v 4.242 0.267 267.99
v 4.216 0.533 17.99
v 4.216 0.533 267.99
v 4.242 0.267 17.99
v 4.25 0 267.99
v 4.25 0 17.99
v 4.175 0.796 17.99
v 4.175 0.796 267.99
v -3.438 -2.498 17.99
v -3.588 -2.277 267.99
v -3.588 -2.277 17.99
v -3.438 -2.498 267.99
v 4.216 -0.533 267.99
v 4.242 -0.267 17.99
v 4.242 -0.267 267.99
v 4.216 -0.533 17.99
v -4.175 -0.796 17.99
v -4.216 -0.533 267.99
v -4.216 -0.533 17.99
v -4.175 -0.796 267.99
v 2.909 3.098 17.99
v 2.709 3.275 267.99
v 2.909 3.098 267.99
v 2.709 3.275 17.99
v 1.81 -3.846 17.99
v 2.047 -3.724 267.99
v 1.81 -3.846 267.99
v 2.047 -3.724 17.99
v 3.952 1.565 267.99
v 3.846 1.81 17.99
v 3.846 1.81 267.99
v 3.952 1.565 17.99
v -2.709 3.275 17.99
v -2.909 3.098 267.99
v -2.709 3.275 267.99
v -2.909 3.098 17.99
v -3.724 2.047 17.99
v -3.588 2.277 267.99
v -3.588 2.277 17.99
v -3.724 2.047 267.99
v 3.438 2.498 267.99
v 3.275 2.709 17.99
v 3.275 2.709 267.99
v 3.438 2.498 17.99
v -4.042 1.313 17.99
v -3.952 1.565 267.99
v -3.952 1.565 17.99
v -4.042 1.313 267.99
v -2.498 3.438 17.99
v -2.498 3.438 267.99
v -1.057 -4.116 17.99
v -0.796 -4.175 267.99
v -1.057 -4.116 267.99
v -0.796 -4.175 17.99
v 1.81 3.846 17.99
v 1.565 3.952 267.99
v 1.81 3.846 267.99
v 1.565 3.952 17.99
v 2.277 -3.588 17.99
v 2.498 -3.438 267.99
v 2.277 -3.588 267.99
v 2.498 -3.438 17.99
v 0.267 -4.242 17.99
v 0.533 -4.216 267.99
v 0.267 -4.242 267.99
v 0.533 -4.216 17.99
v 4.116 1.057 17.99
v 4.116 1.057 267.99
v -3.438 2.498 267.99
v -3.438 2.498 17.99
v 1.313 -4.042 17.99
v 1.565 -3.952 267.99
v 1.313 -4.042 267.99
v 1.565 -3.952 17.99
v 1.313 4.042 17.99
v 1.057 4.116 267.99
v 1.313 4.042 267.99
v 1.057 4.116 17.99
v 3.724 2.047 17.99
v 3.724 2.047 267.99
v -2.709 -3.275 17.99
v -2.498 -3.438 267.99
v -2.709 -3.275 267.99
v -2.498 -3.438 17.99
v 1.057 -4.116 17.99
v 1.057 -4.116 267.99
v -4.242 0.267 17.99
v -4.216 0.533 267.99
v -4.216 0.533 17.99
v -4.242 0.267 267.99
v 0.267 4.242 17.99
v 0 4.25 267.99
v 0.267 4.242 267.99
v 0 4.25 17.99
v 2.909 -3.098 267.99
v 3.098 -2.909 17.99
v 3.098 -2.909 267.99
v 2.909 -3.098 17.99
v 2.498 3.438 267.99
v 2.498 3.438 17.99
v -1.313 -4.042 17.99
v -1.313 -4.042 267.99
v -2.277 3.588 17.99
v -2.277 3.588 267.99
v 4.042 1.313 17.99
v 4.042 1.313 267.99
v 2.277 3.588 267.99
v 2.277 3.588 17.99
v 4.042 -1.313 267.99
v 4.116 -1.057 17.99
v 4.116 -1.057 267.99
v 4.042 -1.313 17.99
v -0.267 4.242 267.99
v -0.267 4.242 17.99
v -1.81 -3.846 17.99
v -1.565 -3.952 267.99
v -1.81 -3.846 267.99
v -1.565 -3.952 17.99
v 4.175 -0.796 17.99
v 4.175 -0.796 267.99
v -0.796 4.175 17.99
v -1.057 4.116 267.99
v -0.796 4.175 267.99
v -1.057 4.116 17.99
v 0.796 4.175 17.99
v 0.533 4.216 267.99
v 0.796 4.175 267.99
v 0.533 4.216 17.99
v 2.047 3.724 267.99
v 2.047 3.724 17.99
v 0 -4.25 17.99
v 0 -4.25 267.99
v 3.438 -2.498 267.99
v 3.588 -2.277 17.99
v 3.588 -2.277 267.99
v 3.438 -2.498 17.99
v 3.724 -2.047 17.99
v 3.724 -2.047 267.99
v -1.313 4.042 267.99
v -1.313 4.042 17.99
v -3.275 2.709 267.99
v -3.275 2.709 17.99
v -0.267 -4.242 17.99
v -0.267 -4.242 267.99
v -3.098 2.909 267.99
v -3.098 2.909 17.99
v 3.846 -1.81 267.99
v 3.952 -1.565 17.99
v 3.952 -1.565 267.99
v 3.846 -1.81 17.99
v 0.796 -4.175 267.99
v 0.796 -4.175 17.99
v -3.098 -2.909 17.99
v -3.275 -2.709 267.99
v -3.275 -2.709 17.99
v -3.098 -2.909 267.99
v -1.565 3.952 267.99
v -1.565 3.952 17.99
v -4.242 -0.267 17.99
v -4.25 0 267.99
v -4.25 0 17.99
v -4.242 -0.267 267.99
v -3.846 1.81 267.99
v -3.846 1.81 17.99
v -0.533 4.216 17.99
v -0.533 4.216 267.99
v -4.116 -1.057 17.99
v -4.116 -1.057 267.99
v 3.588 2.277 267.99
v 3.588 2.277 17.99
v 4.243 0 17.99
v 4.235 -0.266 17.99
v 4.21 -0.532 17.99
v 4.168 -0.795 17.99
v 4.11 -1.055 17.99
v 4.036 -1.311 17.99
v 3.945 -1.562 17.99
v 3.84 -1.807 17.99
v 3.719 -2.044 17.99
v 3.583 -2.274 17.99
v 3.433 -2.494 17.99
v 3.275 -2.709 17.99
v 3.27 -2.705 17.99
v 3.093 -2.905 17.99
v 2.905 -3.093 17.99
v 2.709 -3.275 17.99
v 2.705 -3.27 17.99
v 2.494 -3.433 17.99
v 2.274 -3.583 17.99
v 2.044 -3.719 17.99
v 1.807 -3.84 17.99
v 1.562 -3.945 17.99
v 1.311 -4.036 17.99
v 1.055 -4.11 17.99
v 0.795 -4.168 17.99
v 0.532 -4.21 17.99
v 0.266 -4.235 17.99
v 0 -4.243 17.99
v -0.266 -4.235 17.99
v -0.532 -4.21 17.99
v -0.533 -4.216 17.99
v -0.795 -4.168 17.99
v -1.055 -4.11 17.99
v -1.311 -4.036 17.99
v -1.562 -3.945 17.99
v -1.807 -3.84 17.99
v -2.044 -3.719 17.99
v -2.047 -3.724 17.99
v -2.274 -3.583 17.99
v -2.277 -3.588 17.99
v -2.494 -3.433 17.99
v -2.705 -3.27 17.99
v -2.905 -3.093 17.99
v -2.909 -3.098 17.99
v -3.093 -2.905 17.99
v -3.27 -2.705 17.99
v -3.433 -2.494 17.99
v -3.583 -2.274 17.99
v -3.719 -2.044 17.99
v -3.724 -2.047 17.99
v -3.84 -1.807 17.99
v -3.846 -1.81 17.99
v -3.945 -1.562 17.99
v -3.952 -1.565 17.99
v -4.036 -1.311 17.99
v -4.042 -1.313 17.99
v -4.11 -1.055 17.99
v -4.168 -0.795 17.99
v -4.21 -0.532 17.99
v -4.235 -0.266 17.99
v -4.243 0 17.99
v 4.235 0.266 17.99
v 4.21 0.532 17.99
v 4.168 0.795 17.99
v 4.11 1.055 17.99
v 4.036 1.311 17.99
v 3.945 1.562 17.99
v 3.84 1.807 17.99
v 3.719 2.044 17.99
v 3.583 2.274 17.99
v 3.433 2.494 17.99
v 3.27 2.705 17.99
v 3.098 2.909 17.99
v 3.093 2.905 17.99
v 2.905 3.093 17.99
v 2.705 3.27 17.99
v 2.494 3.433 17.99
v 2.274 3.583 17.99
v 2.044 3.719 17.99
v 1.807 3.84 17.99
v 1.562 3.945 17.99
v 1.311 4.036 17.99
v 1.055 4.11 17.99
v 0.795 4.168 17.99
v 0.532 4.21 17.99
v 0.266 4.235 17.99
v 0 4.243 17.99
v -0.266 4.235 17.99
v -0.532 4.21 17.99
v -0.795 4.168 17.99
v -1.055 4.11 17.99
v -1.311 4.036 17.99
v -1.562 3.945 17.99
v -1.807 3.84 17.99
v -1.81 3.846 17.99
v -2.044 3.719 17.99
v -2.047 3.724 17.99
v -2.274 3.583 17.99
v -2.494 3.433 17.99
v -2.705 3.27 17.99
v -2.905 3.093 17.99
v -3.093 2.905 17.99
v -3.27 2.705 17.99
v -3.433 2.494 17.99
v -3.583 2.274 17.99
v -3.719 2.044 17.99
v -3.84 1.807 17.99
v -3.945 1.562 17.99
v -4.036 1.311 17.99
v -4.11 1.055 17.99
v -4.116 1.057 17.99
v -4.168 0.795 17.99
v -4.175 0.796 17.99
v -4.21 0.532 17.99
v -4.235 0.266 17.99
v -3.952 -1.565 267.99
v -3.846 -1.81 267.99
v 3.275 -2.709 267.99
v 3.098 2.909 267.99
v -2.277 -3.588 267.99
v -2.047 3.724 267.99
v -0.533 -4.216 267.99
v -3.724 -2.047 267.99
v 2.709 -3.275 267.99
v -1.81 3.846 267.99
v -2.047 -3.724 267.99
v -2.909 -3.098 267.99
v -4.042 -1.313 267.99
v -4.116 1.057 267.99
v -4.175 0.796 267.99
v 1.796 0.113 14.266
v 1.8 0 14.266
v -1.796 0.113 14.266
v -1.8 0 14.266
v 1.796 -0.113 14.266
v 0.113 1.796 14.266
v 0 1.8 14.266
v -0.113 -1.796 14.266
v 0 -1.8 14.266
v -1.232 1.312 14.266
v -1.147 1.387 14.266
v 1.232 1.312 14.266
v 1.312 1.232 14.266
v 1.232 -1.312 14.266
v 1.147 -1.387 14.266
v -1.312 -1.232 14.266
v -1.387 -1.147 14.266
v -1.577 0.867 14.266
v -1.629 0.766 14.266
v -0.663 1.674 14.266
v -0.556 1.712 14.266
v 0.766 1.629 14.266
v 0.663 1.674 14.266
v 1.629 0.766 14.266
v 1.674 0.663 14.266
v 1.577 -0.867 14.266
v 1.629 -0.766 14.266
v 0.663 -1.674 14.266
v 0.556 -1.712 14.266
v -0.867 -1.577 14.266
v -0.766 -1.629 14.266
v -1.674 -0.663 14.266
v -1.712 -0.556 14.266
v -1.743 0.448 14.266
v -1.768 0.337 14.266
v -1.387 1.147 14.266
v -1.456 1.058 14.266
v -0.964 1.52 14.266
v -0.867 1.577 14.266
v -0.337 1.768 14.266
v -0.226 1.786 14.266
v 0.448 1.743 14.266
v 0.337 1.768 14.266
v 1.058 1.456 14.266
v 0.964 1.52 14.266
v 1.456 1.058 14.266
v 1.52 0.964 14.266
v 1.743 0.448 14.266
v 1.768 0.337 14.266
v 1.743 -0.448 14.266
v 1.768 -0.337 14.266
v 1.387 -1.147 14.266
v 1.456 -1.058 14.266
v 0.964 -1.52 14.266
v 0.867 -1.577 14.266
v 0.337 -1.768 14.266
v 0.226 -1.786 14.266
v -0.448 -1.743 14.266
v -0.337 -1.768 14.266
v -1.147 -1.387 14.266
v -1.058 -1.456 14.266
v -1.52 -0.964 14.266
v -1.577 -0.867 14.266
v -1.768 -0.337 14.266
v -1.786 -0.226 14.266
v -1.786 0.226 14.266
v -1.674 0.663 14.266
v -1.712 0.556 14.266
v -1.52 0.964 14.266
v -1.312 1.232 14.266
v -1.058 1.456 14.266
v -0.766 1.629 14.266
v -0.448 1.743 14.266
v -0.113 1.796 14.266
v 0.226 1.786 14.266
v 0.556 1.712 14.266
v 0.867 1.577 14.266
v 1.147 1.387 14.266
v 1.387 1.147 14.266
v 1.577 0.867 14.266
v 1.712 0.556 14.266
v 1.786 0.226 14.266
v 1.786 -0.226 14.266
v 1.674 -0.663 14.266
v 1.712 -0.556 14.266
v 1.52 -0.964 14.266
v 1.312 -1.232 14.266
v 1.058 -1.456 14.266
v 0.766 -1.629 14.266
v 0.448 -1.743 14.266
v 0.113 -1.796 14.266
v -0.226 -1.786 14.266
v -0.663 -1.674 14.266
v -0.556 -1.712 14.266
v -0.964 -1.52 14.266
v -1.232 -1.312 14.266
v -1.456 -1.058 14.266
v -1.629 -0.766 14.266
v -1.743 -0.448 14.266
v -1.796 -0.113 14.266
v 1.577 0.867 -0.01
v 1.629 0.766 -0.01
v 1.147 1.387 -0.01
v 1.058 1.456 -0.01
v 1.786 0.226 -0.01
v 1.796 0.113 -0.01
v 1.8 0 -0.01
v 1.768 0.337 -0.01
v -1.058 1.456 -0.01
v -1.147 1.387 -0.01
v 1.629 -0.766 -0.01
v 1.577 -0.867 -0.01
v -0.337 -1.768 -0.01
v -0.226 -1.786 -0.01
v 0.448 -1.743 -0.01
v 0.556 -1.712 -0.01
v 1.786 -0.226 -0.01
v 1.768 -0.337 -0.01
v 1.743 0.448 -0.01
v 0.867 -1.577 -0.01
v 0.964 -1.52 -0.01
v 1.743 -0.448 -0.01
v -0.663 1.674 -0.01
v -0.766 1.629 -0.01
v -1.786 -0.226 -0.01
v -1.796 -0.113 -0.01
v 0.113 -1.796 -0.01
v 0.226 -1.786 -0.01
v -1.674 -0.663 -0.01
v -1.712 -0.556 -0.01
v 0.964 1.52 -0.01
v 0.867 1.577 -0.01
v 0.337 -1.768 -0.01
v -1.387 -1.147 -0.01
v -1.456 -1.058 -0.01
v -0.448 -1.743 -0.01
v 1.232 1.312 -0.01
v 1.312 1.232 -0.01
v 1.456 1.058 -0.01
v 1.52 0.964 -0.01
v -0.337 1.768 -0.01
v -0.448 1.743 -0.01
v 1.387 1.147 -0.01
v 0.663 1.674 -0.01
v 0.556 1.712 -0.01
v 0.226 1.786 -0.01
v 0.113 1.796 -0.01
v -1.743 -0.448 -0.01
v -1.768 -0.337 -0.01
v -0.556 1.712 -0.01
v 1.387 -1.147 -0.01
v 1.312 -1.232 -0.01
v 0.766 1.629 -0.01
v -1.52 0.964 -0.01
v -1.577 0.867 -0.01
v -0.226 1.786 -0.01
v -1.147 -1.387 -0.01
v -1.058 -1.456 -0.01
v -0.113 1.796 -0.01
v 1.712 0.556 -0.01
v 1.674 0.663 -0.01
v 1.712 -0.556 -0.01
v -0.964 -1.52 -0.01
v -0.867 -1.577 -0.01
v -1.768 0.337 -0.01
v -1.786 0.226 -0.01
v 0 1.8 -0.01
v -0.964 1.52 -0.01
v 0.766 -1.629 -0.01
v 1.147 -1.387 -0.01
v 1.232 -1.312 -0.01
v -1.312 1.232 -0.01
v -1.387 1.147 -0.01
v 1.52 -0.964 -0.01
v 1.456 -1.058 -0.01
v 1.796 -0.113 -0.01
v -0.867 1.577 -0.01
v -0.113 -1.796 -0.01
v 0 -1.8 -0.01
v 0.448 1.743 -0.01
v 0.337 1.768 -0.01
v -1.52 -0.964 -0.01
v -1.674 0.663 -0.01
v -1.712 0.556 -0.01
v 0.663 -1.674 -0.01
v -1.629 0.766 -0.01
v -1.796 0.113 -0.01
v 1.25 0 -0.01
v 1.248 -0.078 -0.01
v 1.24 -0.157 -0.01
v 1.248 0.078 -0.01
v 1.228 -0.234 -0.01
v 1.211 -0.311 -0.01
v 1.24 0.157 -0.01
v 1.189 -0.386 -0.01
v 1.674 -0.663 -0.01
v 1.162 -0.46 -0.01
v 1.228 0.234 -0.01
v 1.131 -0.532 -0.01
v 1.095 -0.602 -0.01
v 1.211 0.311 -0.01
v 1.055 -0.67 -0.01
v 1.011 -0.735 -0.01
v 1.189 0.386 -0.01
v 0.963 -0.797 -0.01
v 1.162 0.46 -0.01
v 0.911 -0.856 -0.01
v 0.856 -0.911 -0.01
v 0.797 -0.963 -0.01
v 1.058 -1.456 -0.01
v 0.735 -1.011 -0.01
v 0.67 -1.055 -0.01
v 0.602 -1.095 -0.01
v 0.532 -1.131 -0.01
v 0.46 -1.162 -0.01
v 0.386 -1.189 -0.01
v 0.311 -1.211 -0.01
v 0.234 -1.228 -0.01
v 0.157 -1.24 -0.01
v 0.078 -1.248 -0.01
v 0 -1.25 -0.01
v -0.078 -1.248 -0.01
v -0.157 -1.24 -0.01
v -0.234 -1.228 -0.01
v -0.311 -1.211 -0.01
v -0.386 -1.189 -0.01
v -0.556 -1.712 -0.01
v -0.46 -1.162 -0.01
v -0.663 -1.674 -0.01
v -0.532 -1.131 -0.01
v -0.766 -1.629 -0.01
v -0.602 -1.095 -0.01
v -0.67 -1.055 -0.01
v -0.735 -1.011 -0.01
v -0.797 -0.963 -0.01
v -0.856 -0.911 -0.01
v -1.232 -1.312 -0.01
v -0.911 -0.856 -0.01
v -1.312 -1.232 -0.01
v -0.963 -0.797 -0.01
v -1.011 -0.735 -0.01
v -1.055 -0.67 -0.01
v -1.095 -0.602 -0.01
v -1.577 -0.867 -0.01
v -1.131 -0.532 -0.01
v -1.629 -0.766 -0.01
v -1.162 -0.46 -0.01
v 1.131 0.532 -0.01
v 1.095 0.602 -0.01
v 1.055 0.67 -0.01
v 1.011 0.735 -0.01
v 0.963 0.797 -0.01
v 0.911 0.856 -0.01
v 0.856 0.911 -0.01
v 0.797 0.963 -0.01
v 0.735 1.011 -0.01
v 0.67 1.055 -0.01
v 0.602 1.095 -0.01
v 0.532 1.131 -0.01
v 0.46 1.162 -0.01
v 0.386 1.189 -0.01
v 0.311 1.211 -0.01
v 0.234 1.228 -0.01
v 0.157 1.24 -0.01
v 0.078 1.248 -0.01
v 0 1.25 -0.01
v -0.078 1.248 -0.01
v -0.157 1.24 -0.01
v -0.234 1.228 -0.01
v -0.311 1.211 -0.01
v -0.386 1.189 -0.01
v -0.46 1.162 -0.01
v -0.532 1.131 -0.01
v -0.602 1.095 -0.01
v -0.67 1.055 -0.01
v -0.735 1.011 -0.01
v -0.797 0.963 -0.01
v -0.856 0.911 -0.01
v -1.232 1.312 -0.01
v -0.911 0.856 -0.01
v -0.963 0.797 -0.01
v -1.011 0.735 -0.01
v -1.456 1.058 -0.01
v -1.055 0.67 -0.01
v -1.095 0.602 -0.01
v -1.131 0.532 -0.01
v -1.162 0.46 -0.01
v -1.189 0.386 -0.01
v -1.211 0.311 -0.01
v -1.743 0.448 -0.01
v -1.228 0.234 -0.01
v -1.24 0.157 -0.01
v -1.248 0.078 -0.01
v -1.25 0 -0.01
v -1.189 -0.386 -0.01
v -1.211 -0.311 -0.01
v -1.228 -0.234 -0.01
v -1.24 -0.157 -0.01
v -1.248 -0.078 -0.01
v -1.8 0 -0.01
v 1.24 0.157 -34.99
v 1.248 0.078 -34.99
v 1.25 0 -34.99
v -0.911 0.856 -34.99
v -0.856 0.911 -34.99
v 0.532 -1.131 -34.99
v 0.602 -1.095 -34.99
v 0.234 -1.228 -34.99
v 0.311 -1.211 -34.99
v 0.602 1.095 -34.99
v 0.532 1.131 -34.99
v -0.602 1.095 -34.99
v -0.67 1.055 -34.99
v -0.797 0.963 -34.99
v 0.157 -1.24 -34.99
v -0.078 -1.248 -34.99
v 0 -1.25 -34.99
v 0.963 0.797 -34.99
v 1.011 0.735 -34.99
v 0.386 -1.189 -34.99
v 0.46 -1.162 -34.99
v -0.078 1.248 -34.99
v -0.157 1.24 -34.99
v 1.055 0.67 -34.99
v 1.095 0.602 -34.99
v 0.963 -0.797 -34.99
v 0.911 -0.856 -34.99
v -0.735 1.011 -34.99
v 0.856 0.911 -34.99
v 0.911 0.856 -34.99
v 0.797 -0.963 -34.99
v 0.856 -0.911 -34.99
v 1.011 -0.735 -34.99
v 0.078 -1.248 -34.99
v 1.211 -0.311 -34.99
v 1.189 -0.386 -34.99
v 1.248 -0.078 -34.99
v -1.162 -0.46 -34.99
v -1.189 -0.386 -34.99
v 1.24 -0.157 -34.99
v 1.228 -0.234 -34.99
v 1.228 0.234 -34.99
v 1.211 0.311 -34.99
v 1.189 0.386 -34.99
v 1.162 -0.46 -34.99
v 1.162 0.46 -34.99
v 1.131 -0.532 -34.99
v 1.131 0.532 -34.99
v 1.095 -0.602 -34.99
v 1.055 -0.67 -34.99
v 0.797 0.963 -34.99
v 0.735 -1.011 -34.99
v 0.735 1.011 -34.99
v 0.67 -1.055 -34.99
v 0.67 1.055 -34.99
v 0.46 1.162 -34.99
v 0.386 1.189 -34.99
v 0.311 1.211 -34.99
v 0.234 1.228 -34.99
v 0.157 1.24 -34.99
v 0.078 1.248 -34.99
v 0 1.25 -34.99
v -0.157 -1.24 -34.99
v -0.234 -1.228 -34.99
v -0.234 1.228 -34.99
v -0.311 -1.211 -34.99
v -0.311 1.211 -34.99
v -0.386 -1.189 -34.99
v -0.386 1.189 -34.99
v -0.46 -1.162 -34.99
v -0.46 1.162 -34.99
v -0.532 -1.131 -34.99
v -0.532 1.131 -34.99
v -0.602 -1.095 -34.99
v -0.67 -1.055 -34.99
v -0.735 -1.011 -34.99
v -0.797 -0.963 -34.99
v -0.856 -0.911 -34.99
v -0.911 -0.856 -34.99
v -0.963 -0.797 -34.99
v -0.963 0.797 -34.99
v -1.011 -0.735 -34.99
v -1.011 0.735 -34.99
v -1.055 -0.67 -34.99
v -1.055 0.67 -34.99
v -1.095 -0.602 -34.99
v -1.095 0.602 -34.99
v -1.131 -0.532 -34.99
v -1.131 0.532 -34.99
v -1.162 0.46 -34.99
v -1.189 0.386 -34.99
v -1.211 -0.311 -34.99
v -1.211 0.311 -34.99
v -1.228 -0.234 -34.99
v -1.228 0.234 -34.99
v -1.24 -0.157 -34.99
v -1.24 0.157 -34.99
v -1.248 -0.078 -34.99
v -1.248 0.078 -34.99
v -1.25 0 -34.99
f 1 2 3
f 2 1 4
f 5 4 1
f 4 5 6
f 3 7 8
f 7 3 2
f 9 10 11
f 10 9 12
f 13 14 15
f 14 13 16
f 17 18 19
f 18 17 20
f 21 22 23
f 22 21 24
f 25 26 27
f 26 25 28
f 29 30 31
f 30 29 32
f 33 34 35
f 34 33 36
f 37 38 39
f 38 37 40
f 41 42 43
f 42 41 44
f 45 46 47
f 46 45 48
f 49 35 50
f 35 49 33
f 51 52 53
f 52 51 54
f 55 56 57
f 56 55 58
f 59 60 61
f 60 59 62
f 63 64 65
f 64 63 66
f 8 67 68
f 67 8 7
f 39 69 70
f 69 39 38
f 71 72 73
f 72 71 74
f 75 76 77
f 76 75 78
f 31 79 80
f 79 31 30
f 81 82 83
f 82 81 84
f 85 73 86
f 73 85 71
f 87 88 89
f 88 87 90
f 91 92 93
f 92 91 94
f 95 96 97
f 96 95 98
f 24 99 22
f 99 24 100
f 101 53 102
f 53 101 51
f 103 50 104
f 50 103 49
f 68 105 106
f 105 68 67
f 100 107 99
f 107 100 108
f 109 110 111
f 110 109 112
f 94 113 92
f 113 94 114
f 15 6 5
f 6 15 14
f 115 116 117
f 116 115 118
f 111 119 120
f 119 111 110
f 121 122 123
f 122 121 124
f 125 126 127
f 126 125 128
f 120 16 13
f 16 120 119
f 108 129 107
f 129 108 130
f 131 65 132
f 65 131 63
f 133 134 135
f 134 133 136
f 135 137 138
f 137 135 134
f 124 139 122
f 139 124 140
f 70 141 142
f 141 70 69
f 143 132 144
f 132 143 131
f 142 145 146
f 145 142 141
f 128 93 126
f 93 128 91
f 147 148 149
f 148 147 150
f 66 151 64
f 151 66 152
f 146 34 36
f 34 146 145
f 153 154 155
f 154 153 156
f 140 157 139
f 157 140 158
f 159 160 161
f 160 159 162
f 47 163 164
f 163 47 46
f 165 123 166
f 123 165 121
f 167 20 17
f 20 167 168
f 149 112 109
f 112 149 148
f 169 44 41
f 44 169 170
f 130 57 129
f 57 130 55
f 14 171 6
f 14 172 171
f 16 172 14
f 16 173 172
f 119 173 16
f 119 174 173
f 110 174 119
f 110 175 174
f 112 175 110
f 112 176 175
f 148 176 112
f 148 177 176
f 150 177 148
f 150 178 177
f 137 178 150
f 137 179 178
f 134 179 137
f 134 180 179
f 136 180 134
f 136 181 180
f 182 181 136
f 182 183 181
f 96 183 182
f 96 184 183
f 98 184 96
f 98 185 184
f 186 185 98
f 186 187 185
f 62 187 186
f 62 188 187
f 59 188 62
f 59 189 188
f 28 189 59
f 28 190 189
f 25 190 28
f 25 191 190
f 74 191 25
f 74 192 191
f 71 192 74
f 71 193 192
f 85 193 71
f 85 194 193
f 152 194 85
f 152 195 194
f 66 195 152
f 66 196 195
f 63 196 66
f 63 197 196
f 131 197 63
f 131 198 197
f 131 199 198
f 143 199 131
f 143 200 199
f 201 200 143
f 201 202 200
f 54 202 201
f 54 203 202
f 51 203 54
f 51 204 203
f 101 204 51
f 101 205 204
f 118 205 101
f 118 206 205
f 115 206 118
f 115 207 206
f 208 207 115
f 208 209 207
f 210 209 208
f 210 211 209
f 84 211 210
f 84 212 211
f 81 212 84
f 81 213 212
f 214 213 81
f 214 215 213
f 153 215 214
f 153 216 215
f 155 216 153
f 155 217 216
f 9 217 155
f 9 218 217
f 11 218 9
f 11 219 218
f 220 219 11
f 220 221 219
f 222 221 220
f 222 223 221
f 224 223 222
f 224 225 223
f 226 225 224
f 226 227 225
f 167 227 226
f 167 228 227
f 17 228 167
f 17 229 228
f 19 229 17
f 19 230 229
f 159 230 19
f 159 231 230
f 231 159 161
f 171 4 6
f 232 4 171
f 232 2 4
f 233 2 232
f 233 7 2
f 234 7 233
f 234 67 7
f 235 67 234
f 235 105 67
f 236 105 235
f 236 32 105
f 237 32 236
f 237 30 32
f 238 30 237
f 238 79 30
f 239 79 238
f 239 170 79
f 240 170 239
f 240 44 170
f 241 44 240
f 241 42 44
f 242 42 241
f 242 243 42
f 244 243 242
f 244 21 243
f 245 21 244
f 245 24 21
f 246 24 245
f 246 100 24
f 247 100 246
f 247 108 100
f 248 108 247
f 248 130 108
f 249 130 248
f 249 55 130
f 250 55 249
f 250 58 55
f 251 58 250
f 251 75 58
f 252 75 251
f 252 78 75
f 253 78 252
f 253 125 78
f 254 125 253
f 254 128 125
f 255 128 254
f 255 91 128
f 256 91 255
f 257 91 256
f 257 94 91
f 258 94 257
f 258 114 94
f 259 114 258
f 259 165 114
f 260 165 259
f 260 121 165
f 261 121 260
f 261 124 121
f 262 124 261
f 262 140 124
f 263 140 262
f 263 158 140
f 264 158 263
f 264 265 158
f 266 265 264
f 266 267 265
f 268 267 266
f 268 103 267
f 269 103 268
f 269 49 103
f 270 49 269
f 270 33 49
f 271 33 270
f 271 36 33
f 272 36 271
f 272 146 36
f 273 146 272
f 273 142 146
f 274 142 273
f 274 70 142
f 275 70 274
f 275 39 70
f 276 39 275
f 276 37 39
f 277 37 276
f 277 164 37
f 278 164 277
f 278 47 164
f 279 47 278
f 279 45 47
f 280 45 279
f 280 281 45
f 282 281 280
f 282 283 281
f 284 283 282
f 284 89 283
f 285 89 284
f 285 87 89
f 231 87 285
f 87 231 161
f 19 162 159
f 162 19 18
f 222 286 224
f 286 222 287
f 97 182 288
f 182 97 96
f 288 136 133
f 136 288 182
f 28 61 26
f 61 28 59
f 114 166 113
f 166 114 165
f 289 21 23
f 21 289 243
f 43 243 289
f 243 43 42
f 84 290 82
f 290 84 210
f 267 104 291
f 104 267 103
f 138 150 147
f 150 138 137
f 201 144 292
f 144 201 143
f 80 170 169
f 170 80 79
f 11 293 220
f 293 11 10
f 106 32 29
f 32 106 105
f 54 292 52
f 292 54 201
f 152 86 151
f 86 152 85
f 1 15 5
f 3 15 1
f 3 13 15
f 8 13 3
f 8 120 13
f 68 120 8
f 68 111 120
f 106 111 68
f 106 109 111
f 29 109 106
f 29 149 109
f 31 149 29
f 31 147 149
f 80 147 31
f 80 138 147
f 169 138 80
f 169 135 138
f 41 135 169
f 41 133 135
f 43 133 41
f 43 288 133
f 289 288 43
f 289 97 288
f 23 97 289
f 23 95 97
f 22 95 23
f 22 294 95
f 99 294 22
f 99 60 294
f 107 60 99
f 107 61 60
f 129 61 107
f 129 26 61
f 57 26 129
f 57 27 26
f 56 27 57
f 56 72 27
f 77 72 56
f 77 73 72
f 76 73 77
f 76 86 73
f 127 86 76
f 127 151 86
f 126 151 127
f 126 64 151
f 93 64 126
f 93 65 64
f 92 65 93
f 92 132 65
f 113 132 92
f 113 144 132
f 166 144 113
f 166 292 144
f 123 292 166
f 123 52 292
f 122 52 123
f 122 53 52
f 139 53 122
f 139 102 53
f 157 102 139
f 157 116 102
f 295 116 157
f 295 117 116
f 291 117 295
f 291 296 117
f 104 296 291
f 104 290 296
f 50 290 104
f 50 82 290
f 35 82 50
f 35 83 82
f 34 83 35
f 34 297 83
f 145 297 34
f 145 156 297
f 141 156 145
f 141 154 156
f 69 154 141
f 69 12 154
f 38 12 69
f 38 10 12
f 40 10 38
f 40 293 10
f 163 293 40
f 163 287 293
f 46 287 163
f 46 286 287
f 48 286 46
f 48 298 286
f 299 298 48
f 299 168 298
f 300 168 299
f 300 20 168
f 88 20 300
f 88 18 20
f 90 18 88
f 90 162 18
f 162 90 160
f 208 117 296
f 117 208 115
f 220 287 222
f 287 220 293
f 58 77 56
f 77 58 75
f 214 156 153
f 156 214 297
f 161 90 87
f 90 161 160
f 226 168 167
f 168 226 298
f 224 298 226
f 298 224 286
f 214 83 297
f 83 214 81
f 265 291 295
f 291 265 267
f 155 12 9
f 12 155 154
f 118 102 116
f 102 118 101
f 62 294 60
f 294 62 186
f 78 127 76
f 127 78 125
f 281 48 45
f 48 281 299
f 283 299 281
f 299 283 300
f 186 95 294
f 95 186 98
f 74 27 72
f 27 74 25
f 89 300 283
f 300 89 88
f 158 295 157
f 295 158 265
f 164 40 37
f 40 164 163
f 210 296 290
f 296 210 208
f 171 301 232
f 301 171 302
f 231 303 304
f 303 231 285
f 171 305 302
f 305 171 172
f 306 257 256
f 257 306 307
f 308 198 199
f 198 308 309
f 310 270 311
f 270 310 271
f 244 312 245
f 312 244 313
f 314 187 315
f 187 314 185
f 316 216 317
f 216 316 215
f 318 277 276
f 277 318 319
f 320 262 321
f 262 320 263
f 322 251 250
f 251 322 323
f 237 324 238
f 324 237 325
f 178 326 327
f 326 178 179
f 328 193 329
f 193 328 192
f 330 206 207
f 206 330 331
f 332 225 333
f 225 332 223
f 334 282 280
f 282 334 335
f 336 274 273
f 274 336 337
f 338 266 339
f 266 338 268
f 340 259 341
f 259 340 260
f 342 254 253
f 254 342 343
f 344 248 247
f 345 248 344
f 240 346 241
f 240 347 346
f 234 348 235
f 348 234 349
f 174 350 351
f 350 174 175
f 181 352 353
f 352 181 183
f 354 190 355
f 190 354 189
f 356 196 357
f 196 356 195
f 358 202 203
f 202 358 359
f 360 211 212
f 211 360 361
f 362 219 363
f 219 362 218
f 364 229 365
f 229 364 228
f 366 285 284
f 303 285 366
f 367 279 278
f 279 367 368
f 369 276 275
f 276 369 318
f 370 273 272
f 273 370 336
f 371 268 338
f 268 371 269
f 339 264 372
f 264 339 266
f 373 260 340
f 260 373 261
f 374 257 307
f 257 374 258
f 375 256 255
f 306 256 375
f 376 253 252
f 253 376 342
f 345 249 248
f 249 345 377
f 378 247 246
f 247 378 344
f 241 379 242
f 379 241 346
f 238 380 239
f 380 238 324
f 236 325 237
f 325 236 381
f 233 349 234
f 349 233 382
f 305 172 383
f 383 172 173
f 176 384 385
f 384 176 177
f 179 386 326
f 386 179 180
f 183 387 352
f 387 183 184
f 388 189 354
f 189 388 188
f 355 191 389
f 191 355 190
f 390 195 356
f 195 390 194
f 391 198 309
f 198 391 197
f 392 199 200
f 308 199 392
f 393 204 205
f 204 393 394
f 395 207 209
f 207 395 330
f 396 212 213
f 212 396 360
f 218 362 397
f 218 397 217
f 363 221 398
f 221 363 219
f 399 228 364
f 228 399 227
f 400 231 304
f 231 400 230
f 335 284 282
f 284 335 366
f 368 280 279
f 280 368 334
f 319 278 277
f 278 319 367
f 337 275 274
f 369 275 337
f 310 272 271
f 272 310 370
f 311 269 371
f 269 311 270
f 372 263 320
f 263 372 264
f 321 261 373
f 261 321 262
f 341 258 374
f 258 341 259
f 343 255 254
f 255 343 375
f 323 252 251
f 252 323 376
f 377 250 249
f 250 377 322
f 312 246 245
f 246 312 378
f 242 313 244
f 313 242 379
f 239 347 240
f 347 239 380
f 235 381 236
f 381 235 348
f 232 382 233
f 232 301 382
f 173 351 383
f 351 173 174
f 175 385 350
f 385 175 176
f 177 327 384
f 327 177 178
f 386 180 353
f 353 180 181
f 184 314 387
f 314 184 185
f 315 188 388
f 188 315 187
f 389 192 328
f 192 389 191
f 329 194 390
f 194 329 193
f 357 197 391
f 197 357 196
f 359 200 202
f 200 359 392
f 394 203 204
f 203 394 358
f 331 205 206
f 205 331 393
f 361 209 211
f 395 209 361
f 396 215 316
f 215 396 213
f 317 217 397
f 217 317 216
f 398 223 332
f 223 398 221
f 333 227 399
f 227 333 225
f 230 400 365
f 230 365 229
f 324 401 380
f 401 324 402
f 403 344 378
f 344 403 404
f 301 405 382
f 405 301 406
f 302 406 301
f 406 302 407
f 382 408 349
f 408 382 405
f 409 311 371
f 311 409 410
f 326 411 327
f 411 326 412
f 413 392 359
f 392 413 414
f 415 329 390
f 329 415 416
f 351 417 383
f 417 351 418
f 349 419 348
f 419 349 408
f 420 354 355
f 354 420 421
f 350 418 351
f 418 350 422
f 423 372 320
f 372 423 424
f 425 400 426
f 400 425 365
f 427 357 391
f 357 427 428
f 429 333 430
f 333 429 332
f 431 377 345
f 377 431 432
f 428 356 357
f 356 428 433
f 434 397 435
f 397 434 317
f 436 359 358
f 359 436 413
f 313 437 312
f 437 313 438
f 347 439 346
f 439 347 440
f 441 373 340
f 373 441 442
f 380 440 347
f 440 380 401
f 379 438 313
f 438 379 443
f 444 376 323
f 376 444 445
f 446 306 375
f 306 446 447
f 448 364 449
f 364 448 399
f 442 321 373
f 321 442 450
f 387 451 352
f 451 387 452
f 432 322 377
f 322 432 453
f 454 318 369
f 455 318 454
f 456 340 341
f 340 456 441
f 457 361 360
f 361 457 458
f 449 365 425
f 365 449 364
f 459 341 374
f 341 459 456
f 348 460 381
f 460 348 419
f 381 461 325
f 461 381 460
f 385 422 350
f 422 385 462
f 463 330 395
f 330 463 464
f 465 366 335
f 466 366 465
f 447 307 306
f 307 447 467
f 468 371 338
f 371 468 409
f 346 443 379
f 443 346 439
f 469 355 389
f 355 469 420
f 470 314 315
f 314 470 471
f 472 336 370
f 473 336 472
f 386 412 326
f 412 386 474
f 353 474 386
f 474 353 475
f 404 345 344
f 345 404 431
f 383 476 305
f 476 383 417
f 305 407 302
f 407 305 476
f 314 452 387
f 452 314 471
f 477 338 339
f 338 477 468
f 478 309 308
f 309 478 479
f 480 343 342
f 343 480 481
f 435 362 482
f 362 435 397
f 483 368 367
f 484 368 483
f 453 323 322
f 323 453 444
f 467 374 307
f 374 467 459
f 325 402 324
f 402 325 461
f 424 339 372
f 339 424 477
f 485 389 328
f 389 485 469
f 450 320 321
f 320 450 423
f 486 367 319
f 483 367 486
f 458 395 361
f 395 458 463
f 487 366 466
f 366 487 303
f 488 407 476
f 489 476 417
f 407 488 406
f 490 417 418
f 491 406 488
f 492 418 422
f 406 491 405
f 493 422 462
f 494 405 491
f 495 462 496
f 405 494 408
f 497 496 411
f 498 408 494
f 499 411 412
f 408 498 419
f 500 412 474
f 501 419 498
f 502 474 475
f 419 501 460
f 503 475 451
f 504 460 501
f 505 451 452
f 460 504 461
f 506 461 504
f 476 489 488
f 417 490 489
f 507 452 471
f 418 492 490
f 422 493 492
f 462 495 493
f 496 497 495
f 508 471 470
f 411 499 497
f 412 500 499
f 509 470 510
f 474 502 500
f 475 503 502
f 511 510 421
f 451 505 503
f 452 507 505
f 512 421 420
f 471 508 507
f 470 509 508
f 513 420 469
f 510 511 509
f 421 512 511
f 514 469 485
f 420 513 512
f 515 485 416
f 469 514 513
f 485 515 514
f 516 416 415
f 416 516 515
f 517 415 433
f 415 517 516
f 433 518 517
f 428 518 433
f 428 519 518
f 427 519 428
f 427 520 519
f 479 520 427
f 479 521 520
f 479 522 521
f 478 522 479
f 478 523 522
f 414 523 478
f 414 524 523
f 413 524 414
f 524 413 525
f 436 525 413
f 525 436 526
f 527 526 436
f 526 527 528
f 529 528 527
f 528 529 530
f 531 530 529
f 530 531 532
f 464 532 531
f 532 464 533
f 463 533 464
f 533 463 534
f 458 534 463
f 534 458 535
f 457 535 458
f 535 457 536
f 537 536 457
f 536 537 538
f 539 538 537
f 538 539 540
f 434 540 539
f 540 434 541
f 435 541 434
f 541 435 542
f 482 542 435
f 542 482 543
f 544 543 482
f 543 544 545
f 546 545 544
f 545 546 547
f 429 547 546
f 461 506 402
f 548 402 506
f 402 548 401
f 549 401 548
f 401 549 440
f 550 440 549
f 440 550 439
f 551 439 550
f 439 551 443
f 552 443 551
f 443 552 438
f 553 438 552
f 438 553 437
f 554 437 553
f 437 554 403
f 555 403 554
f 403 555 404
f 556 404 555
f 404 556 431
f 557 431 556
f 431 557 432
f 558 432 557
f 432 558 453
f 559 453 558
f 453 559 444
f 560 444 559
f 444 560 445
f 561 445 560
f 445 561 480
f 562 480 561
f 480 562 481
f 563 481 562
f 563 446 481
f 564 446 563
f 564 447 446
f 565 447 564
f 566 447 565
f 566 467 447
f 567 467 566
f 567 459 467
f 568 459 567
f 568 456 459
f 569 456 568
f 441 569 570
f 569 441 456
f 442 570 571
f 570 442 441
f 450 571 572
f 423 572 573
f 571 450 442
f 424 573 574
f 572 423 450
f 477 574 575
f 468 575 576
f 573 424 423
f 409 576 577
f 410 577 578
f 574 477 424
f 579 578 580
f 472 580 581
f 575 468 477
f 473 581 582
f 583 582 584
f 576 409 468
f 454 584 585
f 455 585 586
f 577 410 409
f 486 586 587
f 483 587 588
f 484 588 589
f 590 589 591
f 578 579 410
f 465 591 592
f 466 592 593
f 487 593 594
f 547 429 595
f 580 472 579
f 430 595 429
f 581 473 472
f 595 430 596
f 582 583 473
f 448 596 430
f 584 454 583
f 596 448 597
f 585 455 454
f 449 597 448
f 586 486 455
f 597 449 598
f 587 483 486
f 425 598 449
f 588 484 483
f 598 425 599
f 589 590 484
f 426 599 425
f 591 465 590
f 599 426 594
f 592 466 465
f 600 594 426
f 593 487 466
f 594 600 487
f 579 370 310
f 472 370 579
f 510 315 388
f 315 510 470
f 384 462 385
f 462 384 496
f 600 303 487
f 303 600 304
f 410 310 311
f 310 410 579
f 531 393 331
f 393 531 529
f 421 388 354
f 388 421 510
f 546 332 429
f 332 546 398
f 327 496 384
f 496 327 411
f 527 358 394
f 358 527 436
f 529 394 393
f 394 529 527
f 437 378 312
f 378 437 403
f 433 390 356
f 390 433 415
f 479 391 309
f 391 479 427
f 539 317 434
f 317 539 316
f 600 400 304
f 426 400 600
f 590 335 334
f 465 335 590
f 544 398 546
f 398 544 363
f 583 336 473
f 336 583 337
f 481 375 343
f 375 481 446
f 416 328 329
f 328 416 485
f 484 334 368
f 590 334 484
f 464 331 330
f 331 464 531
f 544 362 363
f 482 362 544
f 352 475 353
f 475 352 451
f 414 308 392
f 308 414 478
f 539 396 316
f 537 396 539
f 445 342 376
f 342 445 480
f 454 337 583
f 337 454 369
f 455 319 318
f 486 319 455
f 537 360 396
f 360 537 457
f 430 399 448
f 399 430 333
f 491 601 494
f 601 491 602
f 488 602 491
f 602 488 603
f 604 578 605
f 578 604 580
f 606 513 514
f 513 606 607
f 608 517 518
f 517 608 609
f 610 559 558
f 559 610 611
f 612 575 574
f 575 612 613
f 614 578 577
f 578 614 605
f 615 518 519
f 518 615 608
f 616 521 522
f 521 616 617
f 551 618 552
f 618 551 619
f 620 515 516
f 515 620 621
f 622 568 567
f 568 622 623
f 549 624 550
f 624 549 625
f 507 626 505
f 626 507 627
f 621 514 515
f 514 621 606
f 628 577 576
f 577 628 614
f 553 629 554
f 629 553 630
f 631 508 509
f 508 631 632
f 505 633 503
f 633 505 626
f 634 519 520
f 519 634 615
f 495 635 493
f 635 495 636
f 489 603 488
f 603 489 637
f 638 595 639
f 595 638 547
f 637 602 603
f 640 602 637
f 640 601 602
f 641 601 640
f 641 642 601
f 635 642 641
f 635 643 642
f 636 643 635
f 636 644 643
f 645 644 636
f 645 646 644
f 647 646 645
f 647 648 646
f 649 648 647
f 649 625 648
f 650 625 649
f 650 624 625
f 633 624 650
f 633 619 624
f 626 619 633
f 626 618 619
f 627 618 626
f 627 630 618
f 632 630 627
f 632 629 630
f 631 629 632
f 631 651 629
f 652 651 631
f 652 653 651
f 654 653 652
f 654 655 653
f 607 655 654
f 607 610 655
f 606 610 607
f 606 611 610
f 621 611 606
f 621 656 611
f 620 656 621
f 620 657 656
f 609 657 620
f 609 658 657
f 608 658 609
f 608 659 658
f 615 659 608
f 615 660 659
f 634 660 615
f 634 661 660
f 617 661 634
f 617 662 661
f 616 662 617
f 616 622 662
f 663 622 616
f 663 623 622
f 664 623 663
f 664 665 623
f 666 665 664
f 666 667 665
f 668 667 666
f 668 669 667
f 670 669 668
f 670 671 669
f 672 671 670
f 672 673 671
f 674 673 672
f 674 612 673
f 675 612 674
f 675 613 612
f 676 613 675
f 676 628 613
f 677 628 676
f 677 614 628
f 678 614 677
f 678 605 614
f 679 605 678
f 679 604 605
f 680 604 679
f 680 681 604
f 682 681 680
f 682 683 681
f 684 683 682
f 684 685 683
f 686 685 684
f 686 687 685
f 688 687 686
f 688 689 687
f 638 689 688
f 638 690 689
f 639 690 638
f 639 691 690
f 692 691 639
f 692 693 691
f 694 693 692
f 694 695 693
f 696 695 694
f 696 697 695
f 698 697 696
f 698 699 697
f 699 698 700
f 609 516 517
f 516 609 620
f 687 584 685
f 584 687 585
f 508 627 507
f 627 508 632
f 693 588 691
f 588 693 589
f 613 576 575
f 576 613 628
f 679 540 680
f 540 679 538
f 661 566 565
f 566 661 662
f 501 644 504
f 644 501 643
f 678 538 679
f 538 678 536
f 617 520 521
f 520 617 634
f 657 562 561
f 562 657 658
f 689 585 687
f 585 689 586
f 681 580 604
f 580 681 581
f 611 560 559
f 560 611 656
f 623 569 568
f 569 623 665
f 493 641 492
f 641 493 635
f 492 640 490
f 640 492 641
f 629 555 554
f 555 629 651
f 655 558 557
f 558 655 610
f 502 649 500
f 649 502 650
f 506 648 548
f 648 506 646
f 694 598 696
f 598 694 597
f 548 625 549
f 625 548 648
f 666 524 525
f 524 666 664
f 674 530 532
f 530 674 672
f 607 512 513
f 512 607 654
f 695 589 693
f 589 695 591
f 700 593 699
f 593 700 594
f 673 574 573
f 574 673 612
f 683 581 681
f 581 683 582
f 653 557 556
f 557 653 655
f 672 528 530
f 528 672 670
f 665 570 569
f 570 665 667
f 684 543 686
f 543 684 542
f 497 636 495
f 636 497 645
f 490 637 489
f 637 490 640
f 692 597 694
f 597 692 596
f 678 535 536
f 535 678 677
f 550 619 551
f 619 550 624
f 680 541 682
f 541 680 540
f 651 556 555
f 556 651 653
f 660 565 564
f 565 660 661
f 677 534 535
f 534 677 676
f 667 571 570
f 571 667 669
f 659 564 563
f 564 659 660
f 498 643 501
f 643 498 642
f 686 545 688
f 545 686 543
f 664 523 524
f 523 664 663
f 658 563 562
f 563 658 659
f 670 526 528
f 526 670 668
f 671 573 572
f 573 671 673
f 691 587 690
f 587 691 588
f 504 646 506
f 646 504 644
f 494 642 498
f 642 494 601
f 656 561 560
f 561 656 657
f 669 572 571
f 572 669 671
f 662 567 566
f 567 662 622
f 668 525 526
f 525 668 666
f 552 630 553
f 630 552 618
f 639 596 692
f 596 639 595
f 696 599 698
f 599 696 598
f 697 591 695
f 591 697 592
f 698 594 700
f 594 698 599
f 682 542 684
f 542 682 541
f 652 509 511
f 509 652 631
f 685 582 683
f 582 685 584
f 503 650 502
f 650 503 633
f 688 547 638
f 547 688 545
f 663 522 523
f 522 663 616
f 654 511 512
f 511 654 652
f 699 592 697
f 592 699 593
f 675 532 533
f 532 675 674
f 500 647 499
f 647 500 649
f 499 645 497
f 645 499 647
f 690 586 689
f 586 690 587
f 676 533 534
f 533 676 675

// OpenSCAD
module countersunk_screwhole(panel=18,head=8.5,shank=3.6,thread=2.5,length=35) {
    $fn=100;

    // fudge for manifold differences
    f = 0.01;

    // plug hole
    translate([0,0,panel-f])
        cylinder(h=250,r=head/2);

    // head
    translate([0,0,panel-head*0.762])
        cylinder(h=head*0.762,r1=0,r2=head/2);

    // shank
    translate([0,0,-f])
        cylinder(h=panel+f,d=shank);

    // thread hole (for remainder of screw to bite into)
    translate([0,0,-length+f])
        cylinder(d=thread,h=length);
}

countersunk_screwhole();
